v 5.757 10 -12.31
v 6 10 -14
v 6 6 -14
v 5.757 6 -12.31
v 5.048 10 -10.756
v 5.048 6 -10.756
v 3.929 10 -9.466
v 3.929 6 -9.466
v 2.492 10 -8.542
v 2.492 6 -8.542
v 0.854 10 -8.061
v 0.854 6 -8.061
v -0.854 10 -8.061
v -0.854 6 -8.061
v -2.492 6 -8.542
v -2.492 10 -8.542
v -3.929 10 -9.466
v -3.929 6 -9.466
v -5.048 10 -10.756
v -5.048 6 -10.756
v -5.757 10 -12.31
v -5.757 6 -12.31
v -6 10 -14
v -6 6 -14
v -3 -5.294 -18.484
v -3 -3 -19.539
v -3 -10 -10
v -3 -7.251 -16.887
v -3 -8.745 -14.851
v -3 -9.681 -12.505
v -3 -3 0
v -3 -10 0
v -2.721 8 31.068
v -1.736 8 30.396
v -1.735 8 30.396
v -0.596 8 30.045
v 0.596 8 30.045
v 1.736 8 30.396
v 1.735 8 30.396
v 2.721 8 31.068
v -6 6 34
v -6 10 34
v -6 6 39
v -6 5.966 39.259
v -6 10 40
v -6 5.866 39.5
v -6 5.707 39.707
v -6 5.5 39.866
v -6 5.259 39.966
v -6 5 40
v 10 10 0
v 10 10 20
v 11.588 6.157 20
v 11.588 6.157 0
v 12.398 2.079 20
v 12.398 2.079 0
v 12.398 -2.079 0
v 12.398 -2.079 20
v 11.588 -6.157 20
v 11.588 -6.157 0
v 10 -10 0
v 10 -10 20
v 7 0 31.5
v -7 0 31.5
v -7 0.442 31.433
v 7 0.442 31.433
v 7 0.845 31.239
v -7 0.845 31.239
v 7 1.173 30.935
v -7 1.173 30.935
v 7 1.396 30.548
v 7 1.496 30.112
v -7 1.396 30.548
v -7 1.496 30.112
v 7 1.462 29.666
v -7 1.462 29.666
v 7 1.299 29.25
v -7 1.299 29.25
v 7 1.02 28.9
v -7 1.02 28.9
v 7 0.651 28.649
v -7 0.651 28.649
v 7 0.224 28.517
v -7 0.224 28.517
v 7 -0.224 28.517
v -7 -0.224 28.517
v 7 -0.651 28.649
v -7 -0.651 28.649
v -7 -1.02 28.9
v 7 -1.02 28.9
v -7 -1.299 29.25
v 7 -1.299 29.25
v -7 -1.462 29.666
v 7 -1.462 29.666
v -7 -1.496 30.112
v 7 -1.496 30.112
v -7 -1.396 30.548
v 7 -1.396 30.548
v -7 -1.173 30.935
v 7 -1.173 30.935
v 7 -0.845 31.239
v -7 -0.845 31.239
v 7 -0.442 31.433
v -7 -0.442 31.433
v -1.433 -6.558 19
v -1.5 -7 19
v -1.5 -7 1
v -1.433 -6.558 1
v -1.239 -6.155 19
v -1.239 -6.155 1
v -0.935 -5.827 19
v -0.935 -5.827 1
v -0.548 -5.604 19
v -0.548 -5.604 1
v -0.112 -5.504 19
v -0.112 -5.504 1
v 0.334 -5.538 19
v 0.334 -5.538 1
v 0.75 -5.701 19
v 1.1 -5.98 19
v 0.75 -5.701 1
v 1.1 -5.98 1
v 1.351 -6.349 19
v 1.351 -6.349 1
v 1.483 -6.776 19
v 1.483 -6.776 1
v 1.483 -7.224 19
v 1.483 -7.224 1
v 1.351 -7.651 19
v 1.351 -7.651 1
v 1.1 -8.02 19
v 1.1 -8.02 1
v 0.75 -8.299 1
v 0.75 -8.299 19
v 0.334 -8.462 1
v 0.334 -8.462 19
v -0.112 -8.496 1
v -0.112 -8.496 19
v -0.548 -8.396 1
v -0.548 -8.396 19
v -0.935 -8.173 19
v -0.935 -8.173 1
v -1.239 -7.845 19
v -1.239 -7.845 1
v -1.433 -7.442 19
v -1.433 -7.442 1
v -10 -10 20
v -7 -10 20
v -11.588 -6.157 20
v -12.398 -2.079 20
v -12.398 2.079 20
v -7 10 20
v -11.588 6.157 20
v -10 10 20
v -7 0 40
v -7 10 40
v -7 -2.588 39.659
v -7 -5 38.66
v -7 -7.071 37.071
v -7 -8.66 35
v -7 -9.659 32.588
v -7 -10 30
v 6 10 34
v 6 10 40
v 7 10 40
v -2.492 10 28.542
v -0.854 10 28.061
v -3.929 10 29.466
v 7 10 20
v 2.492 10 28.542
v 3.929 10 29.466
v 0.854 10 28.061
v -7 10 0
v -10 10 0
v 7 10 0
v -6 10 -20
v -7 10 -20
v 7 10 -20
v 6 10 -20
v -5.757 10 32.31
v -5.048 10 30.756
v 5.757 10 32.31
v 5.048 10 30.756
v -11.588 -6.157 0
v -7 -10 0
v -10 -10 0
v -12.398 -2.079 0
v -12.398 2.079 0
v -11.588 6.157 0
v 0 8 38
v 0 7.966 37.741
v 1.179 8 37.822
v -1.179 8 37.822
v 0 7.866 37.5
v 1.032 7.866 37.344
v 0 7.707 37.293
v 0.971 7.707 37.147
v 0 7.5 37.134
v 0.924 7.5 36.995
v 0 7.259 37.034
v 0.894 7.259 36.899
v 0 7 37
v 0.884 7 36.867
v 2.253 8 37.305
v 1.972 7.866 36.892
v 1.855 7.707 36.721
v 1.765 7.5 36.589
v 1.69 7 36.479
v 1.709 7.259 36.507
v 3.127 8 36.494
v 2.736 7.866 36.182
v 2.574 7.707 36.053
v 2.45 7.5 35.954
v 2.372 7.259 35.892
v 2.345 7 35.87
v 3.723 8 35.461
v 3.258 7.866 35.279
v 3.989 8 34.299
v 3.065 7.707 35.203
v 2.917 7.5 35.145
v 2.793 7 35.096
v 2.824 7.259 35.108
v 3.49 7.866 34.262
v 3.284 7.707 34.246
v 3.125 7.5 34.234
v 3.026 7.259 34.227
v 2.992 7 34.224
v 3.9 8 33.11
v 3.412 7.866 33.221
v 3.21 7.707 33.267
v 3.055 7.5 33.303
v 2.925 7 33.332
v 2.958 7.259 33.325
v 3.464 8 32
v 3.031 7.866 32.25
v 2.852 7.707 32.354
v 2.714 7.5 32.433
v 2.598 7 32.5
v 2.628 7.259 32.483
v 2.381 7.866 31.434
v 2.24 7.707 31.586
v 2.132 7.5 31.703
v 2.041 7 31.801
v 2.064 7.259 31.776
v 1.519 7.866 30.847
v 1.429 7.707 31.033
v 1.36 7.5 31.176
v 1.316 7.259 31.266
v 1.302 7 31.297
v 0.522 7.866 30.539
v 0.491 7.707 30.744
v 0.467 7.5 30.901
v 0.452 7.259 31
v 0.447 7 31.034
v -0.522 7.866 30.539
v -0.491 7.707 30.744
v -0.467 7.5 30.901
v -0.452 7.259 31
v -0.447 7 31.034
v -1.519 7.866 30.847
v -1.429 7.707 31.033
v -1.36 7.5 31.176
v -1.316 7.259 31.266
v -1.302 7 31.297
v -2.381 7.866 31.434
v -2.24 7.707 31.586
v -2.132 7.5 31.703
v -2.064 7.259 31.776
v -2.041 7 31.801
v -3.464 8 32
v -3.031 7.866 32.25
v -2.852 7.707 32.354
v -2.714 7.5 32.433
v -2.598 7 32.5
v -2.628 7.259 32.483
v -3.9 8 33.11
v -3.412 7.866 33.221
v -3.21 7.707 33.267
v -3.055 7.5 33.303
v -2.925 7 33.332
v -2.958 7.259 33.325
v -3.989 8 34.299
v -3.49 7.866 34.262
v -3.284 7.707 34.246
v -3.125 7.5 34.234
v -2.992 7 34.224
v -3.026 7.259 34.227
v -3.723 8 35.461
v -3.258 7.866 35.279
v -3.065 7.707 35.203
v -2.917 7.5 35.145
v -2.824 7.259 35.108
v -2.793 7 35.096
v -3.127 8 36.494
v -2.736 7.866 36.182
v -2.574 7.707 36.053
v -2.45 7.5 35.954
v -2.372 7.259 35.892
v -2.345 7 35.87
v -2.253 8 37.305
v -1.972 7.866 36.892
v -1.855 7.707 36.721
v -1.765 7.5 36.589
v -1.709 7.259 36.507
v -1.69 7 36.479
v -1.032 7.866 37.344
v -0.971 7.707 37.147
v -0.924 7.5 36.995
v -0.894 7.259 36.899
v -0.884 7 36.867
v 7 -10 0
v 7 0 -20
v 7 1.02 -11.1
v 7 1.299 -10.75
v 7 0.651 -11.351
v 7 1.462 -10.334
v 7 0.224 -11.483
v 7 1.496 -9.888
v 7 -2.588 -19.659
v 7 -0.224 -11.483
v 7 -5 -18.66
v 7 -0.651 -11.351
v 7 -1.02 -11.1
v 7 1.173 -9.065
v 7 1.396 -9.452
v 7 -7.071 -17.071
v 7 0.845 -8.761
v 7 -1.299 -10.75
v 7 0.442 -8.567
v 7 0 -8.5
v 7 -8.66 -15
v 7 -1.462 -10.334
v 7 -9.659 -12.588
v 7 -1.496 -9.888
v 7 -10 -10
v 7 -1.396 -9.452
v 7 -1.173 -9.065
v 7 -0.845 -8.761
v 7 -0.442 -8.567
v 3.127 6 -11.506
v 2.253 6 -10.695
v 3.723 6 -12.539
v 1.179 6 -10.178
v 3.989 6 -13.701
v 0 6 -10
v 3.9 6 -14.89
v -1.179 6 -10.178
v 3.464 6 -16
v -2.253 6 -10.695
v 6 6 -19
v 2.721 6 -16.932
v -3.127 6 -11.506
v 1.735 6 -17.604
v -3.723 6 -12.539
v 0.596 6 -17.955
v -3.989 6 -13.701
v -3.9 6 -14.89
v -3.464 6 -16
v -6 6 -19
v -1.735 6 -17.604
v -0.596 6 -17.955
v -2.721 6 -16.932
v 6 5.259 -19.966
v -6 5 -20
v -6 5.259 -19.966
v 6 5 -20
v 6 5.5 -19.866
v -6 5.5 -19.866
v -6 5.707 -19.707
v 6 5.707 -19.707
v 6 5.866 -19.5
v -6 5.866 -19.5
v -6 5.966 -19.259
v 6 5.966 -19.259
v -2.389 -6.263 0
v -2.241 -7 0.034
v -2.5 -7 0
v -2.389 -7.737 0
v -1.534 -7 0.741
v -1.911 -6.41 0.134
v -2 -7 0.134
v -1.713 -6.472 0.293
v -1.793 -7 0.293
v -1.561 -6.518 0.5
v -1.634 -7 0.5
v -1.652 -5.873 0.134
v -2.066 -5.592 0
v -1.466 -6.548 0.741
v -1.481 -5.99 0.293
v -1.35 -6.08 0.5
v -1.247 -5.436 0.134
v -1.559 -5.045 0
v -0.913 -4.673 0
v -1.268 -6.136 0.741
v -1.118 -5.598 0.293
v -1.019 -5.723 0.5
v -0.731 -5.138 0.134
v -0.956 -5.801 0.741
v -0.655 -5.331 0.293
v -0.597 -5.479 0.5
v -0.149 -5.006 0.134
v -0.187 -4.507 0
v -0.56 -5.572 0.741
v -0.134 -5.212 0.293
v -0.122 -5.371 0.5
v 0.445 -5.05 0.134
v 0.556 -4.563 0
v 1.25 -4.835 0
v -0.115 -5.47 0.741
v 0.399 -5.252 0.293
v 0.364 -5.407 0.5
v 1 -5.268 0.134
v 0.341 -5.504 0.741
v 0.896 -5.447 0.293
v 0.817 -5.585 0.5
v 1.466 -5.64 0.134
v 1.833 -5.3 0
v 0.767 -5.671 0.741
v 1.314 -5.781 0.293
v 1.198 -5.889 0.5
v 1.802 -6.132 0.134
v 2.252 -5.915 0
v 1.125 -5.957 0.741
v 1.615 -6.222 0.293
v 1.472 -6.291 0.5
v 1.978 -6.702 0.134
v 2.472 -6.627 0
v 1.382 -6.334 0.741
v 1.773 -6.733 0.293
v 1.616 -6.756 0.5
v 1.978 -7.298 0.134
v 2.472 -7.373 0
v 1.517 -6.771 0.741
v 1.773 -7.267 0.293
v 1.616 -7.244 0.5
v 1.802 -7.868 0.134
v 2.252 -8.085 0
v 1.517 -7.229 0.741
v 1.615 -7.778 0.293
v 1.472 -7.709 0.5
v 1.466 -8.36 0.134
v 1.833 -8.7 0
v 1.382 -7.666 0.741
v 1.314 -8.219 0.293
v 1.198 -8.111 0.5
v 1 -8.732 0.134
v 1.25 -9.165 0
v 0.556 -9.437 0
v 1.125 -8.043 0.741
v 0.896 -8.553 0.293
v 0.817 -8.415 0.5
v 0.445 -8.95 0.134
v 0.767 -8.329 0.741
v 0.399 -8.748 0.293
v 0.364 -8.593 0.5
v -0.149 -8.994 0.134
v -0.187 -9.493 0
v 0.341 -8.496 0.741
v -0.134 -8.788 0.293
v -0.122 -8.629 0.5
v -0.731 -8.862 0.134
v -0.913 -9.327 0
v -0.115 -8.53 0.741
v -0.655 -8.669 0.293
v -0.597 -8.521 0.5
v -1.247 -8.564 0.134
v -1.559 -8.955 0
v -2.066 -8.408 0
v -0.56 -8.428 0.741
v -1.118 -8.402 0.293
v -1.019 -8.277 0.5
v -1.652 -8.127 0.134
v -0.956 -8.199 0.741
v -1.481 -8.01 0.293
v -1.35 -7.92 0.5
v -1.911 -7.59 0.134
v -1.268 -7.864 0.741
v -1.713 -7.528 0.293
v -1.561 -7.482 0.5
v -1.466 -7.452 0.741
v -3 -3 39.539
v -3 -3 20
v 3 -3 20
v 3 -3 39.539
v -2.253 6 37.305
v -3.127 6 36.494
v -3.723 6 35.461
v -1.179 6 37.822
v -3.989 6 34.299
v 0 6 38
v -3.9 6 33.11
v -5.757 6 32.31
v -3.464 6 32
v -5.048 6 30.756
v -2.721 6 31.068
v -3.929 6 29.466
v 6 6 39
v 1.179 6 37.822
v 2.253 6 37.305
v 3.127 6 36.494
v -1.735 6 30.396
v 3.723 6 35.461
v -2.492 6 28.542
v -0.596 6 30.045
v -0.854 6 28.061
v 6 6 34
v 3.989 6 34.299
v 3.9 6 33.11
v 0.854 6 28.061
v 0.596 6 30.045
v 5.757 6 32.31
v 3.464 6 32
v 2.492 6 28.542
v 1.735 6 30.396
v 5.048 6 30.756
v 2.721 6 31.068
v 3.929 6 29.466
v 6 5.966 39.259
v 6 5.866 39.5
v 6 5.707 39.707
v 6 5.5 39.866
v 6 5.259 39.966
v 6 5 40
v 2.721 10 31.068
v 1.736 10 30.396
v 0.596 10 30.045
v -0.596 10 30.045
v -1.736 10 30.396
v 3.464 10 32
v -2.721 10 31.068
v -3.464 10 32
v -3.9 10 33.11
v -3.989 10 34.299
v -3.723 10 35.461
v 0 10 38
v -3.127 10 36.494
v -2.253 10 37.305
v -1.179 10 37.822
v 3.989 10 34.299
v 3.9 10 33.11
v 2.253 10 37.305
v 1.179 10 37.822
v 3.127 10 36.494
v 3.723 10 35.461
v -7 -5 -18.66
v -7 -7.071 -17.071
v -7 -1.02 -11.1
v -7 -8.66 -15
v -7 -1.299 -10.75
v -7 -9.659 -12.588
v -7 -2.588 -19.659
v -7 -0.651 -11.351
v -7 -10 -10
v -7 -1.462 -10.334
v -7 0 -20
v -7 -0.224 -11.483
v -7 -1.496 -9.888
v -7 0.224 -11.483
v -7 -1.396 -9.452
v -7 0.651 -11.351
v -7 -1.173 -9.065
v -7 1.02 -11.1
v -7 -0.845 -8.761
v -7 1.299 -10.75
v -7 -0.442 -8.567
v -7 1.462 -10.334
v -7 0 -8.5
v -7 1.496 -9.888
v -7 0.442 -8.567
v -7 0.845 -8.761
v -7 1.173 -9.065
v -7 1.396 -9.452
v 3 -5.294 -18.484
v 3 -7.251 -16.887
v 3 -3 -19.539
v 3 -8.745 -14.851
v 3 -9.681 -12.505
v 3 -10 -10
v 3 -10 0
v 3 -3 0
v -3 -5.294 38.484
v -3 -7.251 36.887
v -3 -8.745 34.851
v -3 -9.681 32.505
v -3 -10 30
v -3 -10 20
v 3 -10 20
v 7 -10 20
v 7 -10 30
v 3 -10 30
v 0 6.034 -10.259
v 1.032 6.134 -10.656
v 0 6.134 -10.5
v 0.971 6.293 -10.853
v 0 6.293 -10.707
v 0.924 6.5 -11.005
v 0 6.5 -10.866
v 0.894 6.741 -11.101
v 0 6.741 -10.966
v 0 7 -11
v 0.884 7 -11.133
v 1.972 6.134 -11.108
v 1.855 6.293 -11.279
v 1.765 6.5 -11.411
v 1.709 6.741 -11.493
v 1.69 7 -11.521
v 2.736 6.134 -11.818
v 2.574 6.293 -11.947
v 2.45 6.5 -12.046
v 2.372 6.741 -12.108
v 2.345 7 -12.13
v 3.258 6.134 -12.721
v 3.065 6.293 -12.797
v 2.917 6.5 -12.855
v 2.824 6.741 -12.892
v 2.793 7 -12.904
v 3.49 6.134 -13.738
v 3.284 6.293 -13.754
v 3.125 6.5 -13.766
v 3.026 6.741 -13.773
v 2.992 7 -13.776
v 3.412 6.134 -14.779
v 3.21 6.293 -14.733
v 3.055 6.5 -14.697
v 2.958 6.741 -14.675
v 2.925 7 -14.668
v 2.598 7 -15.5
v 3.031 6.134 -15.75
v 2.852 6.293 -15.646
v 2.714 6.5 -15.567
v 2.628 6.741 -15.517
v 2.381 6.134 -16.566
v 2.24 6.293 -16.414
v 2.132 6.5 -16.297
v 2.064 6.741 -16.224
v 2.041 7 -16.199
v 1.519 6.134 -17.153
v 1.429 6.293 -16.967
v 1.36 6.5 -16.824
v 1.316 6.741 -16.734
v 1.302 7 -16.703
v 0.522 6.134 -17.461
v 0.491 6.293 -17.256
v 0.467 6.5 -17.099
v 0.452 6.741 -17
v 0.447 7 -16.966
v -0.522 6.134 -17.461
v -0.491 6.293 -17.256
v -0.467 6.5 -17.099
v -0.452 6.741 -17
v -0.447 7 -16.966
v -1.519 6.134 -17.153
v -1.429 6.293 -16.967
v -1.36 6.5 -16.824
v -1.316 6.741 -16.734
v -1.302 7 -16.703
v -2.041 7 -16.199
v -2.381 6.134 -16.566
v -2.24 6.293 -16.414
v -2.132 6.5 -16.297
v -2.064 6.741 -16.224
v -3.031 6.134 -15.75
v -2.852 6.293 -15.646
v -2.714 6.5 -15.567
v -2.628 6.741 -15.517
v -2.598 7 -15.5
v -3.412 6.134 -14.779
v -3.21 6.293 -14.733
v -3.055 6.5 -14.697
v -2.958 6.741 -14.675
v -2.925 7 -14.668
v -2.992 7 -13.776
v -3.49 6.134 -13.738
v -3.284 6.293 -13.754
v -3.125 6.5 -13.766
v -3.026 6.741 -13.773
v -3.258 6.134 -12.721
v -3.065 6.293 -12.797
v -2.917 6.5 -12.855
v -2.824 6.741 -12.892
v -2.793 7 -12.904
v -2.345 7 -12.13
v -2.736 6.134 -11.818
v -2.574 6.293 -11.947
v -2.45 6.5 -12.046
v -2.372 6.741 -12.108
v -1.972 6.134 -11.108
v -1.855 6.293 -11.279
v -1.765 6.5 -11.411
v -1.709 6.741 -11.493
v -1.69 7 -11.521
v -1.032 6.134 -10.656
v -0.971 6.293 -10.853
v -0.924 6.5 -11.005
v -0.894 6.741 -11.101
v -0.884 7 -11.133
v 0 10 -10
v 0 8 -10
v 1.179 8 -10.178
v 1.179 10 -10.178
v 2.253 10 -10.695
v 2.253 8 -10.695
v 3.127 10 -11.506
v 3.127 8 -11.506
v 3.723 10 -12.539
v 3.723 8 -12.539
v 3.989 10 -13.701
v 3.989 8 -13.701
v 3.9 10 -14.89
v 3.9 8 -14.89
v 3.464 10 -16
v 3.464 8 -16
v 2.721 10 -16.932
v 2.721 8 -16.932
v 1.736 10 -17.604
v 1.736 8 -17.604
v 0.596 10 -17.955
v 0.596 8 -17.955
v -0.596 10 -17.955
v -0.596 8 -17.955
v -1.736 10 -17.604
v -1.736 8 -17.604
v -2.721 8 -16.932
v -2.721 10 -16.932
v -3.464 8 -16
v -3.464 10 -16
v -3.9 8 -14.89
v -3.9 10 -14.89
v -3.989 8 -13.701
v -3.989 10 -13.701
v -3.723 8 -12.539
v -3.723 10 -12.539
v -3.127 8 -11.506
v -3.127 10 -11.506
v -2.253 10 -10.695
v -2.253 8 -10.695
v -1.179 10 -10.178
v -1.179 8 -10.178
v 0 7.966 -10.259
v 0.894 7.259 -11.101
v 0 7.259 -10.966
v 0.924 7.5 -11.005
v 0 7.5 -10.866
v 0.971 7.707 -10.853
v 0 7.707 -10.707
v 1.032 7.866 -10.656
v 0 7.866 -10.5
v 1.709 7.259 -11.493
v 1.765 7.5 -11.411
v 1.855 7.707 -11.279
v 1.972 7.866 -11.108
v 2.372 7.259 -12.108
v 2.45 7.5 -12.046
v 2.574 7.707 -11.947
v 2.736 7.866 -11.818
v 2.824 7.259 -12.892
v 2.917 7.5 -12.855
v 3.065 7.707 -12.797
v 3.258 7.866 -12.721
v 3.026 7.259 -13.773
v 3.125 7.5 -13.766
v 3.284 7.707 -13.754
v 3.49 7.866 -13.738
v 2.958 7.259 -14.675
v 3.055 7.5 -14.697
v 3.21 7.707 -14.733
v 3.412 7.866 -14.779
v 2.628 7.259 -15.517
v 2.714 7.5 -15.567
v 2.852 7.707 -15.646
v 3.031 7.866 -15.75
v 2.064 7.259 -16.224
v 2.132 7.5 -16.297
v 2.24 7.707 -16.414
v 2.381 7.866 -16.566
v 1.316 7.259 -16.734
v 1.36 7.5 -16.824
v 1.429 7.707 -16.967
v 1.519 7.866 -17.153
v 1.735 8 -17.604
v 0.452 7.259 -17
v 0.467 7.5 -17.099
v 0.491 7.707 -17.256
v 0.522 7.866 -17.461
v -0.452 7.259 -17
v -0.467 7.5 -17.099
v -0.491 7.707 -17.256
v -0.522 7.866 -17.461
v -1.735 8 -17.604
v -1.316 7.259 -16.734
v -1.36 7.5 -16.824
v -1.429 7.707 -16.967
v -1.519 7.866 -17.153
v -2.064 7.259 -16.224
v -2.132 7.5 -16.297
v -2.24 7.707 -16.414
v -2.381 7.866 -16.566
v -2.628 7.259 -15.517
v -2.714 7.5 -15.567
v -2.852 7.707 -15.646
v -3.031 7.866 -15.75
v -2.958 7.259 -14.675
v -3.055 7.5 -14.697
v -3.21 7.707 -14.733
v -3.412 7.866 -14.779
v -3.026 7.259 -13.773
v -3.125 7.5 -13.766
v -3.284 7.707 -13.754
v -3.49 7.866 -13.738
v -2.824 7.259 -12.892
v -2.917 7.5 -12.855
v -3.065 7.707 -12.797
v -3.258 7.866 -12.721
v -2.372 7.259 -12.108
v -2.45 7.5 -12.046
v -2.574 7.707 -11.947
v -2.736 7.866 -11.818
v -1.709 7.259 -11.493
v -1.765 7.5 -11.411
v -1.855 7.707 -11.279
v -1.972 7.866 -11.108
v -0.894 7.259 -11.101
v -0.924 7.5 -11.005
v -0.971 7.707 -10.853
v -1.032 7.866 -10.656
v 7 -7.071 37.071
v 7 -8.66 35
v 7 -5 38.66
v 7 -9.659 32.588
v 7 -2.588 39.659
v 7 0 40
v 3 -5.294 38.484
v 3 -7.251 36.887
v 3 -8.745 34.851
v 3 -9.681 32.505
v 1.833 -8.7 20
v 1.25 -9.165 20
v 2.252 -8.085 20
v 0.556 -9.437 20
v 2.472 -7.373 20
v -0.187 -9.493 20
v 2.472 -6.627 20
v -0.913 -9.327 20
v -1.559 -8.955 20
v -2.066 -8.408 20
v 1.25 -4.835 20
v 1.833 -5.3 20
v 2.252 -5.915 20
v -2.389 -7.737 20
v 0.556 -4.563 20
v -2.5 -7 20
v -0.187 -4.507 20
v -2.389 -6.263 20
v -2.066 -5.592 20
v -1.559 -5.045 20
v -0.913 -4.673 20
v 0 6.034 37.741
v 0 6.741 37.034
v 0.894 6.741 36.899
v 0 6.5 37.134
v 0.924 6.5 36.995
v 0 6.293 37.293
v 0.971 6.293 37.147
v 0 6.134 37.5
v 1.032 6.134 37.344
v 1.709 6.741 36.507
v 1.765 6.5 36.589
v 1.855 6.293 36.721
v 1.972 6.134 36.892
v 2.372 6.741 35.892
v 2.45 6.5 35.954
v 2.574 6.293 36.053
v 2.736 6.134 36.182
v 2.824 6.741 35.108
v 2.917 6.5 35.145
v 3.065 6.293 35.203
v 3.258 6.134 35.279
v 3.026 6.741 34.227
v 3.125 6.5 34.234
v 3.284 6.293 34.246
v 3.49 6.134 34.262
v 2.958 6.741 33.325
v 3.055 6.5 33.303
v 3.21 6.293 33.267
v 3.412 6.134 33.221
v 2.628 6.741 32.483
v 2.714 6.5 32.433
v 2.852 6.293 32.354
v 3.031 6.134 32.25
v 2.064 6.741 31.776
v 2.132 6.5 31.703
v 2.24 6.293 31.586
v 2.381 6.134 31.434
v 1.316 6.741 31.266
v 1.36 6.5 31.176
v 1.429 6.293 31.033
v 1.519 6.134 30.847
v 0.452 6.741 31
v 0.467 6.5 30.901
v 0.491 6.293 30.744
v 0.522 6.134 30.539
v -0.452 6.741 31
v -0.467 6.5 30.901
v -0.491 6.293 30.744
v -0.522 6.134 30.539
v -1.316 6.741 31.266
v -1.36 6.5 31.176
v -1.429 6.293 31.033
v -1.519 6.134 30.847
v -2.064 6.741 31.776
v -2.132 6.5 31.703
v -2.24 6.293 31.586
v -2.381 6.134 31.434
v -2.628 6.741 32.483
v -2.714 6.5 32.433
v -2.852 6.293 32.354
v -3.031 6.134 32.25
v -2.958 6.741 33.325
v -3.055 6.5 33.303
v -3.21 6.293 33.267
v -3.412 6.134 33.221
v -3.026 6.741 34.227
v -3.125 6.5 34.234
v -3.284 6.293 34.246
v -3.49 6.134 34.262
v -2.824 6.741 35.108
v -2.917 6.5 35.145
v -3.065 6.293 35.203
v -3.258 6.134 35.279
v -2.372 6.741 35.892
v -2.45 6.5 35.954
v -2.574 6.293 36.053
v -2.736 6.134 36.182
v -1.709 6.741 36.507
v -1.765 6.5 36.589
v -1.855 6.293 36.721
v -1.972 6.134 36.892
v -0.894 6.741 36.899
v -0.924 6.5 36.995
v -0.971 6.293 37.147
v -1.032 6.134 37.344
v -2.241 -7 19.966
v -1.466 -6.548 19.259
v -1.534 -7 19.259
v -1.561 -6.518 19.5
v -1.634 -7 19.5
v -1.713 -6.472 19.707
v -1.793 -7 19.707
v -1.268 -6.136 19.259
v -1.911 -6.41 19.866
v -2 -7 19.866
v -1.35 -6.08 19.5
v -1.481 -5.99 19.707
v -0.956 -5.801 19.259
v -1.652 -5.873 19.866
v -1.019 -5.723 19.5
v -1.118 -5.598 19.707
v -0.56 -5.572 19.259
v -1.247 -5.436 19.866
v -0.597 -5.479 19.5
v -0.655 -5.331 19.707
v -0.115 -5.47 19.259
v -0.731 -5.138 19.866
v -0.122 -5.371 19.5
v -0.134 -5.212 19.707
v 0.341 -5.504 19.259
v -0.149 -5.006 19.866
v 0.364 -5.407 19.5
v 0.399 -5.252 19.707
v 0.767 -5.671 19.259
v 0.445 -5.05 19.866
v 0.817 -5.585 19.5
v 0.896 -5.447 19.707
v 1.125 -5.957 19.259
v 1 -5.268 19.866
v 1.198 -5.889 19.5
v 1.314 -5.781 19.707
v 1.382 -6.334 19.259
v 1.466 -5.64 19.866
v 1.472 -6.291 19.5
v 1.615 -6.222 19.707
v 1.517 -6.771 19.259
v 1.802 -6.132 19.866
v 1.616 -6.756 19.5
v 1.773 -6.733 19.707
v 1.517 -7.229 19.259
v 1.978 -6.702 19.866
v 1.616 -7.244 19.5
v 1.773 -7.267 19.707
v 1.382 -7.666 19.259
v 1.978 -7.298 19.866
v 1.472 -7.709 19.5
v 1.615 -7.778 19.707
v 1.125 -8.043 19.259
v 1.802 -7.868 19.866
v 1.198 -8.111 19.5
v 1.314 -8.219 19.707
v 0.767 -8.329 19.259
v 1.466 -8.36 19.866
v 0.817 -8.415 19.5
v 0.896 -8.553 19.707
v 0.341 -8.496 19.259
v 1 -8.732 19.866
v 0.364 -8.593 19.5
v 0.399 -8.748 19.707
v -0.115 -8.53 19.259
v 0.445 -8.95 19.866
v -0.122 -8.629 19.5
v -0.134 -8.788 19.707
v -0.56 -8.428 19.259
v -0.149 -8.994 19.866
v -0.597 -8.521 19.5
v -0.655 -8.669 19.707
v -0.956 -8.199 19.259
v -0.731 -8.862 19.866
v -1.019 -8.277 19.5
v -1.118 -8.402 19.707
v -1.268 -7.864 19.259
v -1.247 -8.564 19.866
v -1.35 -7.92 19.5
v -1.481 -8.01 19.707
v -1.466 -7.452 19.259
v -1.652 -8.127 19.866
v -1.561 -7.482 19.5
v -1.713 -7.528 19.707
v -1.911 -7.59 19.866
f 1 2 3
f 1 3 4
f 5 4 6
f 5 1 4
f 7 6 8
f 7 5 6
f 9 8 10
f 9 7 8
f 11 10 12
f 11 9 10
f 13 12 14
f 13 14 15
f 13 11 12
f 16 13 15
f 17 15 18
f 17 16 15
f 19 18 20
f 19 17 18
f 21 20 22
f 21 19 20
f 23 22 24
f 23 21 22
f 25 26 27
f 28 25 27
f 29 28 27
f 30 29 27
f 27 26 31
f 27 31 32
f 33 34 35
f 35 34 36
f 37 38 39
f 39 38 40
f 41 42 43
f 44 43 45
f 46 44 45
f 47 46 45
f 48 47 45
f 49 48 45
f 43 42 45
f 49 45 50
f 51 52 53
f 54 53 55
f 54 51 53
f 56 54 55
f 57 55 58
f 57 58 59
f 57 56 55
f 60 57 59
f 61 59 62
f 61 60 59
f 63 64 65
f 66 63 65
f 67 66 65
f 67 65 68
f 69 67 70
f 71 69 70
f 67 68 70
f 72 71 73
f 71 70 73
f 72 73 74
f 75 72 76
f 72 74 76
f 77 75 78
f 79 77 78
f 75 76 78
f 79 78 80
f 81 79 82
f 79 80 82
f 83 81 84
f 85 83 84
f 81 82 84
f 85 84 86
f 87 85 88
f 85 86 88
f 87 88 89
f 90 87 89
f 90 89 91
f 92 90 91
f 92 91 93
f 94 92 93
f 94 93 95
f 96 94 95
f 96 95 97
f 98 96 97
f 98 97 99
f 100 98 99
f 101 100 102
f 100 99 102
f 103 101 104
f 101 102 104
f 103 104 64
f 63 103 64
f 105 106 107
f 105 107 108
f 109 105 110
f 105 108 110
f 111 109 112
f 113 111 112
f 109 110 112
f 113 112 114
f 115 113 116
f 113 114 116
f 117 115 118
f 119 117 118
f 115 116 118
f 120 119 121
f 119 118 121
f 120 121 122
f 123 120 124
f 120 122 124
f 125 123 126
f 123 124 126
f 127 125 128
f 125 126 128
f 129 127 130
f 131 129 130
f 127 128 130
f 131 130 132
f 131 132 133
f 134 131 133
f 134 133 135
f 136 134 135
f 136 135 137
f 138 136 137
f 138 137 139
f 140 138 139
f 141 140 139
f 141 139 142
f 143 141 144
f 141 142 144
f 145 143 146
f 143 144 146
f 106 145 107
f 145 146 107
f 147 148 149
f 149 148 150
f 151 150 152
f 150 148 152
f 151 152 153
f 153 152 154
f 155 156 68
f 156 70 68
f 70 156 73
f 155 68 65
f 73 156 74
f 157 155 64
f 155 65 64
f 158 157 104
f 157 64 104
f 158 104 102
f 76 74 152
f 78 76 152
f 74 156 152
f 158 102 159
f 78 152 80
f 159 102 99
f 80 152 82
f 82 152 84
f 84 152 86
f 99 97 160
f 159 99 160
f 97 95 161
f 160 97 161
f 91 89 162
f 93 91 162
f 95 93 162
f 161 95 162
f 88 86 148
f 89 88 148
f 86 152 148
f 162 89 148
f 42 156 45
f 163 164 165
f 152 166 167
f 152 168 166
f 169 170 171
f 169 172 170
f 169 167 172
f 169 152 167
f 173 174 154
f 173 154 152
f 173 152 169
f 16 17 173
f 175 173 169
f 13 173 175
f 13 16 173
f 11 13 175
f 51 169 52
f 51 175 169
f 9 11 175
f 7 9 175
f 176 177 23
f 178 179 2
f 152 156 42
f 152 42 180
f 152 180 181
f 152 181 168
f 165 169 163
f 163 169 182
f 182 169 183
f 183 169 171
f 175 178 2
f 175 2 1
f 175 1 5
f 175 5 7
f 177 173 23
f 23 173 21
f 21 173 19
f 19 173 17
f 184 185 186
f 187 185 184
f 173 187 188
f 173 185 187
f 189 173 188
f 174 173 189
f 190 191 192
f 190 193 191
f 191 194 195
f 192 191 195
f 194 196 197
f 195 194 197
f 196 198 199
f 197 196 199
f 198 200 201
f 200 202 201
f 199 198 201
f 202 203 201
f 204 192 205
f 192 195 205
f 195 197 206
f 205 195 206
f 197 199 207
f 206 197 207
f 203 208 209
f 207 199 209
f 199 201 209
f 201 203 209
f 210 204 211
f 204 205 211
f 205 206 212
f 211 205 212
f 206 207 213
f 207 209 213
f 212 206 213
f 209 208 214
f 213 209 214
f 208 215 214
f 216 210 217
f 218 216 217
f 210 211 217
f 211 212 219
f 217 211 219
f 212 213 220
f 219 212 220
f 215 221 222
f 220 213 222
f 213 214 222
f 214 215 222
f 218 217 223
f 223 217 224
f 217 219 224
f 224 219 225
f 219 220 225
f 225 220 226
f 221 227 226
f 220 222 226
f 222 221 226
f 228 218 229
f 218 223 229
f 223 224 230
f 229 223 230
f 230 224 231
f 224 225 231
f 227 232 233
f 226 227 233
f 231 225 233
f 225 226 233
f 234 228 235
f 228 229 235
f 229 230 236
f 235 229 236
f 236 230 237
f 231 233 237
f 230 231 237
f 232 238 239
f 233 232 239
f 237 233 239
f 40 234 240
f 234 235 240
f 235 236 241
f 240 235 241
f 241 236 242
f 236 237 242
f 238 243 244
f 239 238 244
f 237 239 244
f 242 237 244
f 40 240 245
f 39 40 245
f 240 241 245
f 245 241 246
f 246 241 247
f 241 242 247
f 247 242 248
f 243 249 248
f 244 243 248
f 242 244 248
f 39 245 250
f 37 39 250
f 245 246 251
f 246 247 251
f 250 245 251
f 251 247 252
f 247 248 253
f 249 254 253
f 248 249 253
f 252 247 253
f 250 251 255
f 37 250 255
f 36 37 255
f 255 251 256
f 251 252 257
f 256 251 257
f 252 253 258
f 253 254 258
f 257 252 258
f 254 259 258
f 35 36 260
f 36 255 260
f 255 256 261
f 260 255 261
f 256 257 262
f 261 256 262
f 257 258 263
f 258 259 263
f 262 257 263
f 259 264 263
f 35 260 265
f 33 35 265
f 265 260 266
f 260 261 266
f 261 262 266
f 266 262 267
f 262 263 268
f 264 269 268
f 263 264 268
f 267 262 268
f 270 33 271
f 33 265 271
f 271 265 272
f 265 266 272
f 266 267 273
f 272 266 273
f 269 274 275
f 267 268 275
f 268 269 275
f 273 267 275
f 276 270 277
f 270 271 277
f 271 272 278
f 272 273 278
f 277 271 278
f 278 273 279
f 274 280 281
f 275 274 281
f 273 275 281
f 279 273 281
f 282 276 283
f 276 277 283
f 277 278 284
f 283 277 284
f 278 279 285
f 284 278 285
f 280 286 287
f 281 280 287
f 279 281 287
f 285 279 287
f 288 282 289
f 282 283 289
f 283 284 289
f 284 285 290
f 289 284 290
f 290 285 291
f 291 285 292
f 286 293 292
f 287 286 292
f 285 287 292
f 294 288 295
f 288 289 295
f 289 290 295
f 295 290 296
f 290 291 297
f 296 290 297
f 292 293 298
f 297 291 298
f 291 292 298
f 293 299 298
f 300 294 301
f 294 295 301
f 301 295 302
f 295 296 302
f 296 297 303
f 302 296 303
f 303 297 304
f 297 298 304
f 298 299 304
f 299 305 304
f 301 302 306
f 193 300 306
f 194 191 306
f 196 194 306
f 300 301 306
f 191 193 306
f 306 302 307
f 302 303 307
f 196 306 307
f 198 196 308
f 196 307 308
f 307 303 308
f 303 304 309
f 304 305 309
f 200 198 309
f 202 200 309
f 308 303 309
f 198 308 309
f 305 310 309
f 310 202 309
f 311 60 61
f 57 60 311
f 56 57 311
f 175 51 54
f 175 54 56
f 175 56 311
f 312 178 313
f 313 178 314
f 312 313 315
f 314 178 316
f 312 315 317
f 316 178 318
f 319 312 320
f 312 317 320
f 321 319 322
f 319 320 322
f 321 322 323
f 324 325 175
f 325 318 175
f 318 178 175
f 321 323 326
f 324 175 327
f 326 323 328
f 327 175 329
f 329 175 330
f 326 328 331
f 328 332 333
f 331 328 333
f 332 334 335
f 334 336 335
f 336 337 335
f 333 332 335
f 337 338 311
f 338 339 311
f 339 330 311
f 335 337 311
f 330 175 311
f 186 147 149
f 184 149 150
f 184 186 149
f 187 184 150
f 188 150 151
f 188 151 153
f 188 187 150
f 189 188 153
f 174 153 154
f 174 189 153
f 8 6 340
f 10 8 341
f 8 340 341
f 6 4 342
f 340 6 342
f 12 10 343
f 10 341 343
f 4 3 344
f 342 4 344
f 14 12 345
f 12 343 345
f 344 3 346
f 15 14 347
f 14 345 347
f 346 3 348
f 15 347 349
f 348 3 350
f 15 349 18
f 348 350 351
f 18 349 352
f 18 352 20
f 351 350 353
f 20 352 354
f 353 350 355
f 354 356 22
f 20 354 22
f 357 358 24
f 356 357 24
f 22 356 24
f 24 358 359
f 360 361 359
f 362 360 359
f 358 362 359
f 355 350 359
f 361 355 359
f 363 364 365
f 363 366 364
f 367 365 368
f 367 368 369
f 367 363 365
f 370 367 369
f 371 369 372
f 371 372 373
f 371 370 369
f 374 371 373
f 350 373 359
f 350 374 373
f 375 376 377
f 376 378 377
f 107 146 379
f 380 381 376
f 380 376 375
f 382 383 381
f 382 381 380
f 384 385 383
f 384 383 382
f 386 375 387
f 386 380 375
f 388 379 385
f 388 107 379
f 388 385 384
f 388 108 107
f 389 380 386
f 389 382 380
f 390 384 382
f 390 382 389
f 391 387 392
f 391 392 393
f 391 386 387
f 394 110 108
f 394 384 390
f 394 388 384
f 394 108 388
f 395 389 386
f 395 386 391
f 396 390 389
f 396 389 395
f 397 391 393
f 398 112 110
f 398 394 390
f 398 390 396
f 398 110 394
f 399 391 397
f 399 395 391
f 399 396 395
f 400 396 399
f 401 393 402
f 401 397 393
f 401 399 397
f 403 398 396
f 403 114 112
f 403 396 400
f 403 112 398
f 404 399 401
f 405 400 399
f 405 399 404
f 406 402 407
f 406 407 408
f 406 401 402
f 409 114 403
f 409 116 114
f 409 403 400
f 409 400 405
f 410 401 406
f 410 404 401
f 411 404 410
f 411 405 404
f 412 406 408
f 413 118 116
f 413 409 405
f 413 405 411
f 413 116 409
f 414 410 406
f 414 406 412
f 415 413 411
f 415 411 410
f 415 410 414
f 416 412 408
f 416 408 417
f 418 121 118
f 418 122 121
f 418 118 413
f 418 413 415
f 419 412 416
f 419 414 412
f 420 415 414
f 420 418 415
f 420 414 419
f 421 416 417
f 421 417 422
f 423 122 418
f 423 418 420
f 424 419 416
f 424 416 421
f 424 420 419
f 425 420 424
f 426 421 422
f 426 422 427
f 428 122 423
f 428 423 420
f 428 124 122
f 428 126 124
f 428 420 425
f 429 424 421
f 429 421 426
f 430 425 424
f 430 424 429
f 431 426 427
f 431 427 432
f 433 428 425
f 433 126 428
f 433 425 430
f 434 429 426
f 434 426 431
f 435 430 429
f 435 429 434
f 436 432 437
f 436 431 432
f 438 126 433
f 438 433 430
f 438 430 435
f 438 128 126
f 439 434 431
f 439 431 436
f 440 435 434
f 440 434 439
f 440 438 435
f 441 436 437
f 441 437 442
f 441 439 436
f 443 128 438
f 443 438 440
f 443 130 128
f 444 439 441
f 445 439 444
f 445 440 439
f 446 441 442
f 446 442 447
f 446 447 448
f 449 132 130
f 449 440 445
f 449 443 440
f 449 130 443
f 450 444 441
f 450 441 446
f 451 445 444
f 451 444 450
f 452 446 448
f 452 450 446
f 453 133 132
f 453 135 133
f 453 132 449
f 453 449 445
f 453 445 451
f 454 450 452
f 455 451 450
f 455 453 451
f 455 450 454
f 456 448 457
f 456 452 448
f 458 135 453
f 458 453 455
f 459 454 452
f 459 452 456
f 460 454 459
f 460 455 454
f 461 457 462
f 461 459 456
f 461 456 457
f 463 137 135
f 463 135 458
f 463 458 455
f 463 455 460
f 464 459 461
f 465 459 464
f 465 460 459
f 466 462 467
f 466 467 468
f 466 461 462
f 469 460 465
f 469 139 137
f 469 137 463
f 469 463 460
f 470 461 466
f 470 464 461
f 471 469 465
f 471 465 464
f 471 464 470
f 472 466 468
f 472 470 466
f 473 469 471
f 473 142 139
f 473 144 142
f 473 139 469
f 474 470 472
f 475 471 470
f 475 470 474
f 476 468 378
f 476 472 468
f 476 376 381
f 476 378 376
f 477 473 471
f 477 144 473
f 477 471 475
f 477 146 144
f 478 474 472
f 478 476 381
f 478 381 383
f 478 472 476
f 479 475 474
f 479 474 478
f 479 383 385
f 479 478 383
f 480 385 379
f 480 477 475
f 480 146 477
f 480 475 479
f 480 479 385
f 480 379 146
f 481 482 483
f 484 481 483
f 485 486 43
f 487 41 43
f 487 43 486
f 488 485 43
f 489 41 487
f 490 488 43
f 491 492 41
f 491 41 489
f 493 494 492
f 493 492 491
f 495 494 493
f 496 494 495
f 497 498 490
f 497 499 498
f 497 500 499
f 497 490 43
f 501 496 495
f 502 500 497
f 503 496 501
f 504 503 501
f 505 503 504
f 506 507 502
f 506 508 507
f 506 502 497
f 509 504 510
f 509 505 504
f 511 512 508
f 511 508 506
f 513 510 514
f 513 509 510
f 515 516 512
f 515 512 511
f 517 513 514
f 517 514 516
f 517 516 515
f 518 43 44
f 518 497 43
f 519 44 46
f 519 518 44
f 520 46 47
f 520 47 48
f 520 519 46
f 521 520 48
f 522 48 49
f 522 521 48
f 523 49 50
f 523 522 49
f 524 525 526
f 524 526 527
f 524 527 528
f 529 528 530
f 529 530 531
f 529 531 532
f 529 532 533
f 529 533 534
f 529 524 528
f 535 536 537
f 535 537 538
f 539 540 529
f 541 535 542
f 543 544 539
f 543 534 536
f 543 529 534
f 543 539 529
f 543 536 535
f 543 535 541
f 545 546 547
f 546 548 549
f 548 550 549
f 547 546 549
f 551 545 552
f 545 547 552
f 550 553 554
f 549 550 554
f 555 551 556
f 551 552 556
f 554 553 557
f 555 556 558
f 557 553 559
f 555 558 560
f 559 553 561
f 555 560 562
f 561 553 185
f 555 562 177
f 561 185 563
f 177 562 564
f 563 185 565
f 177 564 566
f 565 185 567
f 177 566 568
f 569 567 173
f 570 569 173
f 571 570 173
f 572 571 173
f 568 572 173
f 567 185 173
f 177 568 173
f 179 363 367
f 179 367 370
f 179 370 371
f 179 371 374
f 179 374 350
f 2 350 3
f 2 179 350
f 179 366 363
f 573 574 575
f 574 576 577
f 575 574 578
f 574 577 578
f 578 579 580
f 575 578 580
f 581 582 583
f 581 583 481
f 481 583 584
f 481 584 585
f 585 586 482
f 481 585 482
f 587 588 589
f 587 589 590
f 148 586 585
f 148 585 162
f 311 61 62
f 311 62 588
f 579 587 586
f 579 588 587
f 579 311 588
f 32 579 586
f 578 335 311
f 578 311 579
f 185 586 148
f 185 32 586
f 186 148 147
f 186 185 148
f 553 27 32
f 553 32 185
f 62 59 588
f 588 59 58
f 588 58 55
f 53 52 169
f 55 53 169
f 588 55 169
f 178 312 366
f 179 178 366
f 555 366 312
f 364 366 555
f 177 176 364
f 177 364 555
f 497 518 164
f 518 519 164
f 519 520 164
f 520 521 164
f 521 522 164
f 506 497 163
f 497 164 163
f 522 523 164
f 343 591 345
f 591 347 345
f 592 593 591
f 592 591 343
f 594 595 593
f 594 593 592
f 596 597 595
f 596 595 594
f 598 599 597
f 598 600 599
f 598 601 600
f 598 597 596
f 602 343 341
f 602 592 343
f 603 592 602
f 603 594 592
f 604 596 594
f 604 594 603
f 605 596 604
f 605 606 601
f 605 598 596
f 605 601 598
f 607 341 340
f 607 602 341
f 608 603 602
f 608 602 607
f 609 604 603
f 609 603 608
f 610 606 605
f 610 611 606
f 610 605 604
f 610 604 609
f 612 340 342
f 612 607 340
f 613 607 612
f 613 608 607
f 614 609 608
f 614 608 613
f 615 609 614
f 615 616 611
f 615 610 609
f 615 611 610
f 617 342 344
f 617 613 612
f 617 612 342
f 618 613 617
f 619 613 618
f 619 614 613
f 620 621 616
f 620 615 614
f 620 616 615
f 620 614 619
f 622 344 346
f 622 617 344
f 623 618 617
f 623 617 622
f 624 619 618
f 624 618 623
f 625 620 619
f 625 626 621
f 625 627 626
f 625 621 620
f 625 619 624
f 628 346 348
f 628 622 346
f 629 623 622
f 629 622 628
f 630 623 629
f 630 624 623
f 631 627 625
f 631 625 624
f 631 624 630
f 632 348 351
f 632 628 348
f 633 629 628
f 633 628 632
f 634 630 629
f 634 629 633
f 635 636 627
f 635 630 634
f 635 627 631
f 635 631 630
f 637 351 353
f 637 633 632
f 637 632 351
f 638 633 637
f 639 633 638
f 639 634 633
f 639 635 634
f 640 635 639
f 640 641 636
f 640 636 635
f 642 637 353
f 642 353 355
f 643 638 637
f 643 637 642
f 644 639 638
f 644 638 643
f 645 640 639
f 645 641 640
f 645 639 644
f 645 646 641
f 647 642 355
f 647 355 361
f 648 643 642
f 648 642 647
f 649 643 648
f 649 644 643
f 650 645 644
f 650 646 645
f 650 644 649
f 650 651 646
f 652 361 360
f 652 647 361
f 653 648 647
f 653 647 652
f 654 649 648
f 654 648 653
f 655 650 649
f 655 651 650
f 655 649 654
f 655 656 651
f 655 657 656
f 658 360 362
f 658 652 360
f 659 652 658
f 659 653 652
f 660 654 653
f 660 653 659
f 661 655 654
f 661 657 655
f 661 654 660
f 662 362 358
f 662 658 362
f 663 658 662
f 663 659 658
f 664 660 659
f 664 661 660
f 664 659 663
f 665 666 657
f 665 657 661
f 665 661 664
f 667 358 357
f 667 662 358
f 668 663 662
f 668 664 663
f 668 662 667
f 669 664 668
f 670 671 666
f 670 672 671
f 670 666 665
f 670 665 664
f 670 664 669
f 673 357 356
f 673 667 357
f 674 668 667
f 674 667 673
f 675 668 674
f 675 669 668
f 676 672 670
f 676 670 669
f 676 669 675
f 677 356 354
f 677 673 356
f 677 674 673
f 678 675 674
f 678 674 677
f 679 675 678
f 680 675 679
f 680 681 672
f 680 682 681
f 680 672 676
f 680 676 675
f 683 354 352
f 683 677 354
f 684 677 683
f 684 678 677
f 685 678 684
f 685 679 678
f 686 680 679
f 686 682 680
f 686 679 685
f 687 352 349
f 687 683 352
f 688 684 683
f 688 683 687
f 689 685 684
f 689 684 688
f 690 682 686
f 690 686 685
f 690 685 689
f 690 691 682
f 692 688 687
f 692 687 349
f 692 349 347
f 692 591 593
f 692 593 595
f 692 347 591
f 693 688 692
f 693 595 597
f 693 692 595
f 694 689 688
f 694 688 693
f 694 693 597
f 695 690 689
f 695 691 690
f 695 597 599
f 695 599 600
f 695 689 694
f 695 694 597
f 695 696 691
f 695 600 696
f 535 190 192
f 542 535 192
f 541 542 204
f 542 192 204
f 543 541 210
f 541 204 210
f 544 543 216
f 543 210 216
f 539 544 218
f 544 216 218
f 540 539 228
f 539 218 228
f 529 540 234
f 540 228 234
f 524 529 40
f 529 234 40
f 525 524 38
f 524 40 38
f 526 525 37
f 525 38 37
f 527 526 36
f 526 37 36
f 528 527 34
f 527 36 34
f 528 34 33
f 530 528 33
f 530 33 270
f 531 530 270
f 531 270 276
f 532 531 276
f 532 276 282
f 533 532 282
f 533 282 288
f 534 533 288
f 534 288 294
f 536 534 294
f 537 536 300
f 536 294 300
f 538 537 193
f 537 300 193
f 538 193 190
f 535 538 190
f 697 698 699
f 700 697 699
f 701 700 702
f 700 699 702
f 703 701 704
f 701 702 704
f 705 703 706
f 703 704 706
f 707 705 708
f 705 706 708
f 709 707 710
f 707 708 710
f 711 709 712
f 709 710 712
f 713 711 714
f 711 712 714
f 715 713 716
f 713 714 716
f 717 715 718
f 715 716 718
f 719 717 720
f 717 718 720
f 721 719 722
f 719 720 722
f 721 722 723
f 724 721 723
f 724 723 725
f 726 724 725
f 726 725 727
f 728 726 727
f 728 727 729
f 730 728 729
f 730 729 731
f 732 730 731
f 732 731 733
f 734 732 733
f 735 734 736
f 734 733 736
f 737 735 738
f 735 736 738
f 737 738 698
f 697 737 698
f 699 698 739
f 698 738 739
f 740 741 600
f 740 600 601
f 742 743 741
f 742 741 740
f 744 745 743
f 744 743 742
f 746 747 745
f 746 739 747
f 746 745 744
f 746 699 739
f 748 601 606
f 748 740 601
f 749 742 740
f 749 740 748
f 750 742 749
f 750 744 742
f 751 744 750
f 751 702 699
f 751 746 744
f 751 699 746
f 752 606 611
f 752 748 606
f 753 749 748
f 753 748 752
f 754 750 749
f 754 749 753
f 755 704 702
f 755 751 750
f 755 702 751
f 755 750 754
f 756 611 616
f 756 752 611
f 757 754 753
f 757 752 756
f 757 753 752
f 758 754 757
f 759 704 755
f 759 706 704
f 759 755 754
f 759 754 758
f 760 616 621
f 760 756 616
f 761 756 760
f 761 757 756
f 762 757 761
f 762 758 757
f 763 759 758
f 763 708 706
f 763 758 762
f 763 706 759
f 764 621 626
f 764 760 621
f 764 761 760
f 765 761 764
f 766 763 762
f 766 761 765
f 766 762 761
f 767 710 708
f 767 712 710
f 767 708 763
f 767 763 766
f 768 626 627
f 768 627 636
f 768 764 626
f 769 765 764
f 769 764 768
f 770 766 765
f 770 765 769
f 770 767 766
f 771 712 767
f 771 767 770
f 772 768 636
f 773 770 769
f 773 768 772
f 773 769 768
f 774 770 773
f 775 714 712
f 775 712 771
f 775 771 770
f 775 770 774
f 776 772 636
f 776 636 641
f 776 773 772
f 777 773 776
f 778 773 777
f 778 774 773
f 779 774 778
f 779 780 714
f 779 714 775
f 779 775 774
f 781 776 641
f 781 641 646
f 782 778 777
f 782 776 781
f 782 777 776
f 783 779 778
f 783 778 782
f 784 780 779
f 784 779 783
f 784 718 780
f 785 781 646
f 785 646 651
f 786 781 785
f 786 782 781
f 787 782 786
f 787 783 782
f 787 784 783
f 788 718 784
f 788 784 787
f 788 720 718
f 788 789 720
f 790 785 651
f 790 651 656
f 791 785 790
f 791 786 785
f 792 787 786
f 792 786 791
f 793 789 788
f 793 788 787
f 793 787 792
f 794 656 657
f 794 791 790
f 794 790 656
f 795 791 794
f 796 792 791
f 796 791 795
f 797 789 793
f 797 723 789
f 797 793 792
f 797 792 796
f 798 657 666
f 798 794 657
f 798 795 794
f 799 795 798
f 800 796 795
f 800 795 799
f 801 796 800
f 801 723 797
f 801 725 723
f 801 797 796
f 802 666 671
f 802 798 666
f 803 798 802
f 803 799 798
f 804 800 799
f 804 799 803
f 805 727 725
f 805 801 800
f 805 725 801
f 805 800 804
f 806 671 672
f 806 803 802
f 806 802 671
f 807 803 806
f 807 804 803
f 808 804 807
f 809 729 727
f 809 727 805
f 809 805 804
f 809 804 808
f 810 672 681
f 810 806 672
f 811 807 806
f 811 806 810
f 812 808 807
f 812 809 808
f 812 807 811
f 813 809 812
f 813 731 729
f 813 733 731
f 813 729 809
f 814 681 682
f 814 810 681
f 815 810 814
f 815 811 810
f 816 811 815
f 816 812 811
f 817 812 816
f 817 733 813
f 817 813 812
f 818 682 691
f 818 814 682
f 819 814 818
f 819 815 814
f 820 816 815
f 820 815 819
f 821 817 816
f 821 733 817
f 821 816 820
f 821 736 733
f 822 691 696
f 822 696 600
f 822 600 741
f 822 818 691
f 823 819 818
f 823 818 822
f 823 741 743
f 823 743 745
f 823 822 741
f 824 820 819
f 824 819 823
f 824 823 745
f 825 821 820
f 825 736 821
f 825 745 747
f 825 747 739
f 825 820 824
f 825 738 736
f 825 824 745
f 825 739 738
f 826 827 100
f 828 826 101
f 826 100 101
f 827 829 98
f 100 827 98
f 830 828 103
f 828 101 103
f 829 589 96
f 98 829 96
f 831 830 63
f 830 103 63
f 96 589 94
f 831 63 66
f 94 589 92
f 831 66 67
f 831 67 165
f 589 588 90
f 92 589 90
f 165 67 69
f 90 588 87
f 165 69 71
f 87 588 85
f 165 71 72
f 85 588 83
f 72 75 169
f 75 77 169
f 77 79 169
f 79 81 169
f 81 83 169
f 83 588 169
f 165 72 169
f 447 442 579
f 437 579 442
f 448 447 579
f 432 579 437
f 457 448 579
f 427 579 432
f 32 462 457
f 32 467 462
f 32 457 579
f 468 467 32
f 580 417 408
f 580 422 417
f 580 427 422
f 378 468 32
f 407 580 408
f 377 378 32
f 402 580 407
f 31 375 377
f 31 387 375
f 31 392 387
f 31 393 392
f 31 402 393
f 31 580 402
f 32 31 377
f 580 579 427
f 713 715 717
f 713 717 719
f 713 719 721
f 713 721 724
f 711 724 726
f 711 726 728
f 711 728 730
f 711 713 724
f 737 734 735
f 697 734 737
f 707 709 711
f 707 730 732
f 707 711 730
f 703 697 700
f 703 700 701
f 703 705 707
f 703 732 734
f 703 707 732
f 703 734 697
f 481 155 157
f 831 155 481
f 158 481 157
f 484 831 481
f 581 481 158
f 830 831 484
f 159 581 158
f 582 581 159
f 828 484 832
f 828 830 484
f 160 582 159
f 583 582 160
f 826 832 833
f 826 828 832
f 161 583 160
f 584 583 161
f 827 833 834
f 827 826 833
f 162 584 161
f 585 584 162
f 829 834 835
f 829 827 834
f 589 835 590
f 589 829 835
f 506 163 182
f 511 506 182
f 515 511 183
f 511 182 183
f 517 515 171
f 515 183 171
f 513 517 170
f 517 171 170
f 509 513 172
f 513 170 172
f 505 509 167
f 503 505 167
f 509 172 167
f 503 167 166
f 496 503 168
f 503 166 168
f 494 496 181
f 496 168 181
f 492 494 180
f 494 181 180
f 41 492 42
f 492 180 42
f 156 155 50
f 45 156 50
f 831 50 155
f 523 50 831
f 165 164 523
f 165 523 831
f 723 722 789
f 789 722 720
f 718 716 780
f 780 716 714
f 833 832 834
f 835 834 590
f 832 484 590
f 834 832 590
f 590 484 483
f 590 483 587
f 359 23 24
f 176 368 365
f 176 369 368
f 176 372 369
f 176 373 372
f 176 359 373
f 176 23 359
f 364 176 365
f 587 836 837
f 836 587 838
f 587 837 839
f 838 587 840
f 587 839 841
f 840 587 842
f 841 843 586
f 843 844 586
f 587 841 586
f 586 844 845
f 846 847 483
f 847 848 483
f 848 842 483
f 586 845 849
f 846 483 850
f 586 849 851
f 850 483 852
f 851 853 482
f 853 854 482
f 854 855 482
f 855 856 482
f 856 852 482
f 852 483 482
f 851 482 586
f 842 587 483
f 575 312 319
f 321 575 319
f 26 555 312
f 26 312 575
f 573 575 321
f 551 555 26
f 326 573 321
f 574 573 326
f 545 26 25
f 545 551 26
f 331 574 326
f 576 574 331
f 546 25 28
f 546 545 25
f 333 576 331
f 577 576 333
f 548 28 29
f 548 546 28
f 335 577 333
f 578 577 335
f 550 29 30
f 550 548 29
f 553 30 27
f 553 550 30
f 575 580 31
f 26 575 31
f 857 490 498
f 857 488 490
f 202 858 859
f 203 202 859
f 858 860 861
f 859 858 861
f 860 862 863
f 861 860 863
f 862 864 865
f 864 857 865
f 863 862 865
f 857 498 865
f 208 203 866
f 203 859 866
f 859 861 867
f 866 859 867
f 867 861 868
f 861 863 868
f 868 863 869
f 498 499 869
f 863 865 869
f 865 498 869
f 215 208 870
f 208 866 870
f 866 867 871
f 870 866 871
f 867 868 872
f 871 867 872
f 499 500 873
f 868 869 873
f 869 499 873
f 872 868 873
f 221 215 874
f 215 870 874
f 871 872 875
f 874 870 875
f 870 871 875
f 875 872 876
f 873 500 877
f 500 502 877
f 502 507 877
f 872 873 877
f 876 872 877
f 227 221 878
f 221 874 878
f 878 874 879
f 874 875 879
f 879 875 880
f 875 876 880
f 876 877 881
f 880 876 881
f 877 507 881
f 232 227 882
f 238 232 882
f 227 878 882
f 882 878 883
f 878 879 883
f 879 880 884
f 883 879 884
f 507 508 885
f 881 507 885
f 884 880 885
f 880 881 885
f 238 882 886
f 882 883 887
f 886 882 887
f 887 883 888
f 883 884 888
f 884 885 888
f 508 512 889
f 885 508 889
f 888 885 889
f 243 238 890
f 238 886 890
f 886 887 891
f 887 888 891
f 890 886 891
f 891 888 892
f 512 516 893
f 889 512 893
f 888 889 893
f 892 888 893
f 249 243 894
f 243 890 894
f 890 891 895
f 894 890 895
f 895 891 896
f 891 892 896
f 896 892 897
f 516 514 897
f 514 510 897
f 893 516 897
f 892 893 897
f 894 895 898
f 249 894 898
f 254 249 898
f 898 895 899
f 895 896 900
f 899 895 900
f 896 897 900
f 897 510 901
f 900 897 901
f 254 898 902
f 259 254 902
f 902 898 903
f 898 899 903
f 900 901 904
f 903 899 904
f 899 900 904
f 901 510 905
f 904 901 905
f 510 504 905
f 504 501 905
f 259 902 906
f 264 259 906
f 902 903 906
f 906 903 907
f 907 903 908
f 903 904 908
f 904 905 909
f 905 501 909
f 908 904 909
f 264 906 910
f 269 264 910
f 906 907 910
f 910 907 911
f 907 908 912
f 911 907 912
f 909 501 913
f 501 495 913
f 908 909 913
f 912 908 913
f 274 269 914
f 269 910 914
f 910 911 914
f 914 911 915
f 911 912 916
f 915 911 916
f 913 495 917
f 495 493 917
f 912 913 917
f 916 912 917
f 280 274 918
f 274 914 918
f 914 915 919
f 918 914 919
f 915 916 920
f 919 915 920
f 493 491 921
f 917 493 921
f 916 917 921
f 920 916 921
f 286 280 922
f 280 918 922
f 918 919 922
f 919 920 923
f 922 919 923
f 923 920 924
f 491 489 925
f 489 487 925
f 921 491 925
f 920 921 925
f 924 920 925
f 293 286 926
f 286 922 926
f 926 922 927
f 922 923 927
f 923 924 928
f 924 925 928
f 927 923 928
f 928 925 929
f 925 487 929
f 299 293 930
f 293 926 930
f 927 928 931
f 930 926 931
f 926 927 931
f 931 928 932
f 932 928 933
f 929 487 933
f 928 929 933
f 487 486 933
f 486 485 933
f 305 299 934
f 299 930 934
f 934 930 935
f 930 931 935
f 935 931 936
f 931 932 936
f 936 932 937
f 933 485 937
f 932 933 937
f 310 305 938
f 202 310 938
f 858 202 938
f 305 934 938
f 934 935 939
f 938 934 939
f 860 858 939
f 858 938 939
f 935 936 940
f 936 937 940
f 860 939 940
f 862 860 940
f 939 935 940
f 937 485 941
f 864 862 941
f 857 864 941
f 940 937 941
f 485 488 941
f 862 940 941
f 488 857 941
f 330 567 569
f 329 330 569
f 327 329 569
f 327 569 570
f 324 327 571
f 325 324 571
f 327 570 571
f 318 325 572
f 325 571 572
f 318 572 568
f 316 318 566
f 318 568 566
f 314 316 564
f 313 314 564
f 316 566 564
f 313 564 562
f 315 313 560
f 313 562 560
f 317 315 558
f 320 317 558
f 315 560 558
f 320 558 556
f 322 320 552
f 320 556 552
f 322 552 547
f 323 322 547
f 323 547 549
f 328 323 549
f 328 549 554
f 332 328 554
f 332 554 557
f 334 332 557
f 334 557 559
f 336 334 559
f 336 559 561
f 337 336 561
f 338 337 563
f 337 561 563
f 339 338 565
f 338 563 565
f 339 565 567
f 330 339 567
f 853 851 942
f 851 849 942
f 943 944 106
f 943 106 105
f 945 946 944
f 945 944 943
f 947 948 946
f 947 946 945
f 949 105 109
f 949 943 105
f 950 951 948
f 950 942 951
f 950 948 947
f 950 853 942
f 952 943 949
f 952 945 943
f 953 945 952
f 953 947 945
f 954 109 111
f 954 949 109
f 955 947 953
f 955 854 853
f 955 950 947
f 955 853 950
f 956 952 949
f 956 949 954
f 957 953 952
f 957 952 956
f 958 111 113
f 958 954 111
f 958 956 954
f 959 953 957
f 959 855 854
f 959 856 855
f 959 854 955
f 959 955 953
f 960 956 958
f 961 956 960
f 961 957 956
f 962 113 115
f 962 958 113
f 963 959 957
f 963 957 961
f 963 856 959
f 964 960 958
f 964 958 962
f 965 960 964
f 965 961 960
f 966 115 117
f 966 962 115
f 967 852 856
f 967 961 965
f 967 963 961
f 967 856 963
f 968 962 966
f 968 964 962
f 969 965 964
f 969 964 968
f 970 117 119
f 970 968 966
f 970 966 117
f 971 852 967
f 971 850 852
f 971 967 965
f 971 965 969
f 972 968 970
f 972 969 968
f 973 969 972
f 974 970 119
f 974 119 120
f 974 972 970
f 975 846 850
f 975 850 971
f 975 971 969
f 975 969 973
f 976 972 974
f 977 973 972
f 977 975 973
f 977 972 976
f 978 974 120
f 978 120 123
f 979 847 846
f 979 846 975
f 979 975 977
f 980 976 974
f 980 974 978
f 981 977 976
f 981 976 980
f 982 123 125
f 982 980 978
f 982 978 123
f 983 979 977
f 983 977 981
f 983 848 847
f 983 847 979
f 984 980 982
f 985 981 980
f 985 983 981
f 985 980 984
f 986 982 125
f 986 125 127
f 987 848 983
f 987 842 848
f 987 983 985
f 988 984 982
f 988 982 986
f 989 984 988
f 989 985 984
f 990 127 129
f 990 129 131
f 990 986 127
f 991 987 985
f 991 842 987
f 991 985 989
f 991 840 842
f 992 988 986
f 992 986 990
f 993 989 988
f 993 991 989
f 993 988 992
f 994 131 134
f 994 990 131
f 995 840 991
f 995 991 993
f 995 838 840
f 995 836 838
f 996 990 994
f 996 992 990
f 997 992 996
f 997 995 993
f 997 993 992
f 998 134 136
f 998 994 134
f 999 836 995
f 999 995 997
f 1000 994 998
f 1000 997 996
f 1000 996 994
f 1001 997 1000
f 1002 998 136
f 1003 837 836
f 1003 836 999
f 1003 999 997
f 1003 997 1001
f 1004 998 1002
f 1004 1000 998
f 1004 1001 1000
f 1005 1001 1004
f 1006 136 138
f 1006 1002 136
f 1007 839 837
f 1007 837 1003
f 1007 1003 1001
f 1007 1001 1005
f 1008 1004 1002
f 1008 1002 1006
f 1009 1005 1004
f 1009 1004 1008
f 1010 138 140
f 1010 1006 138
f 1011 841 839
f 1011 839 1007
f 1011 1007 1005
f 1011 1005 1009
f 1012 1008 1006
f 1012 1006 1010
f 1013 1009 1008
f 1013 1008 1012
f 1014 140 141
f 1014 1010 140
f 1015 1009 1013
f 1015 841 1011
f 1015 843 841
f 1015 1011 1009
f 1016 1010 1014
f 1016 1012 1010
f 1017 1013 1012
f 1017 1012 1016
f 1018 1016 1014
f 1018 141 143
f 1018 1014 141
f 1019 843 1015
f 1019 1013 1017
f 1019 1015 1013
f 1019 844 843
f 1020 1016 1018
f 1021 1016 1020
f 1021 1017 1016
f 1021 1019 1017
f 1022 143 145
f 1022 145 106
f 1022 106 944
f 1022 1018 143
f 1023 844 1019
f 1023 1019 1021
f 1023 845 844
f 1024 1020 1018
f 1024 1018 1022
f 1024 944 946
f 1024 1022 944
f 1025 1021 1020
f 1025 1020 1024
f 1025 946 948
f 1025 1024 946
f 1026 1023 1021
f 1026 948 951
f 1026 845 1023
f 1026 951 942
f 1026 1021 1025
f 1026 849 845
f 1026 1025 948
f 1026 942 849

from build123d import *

# Parameters (mm, degrees)
SALIENTE_EXTRUIR1_DEPTH = 20
CROQUIS5_R              = 1.5
CORTAR_EXTRUIR3_DEPTH   = 20
SALIENTE_EXTRUIR2_DEPTH = 20
SALIENTE_EXTRUIR3_DEPTH = 20
CROQUIS4_R              = 1.5
CORTAR_EXTRUIR2_DEPTH   = 14
REDONDEO1_R             = 10
CUT_EXTRUDE1_DEPTH      = 4
SKETCH2_R               = 3
BOSS_EXTRUDE1_DEPTH     = 2
SKETCH3_R               = 4
BOSS_EXTRUDE2_DEPTH     = 2
FILLET1_R               = 1
FILLET2_R               = 1
FILLET3_R               = 1


with BuildPart() as part:
    # Croquis1 → Saliente-Extruir1 (new body)
    with BuildSketch(Plane.XY):
        with BuildLine():
            Line((-10, 10), (10, 10))
            ThreePointArc((10, 10), (12.5, 0), (10, -10))
            Line((10, -10), (-10, -10))
            ThreePointArc((-10, -10), (-12.5, 0), (-10, 10))
        make_face()
    extrude(amount=SALIENTE_EXTRUIR1_DEPTH)

    # Croquis5 → Cortar-Extruir3 (cut)
    with BuildSketch(Plane(origin=(0, 0, 0), x_dir=(-1, 0, 0), z_dir=(0, 0, -1))):
        with Locations((0, -7)):
            Circle(CROQUIS5_R)
    extrude(amount=-CORTAR_EXTRUIR3_DEPTH, mode=Mode.SUBTRACT)

    # Croquis2 → Saliente-Extruir2 (add)
    with BuildSketch(Plane(origin=(0, 0, 0), x_dir=(-1, 0, 0), z_dir=(0, 0, -1))):
        Polygon((-7, 10), (-7, -10), (-3, -10), (-3, -3), (3, -3), (3, -10), (7, -10), (7, 10), align=None)
    extrude(amount=SALIENTE_EXTRUIR2_DEPTH)

    # Croquis3 → Saliente-Extruir3 (add)
    with BuildSketch(Plane.XY.offset(20)):
        Polygon((-7, 10), (-7, -10), (-3, -10), (-3, -3), (3, -3), (3, -10), (7, -10), (7, 10), align=None)
    extrude(amount=SALIENTE_EXTRUIR3_DEPTH)

    # Croquis4 → Cortar-Extruir2 (cut)
    with BuildSketch(Plane.ZY.offset(7)):
        with Locations((-10, 0)):
            Circle(CROQUIS4_R)
        with Locations((30, 0)):
            Circle(CROQUIS4_R)
    extrude(amount=-CORTAR_EXTRUIR2_DEPTH, mode=Mode.SUBTRACT)

    # Redondeo1
    redondeo1_edges = [part.edges().sort_by_distance(p)[0] for p in [
        (-5, -10, 40),
        (-5, -10, -20),
    ]]
    fillet(redondeo1_edges, radius=REDONDEO1_R)

    # Sketch1 → Cut-Extrude1 (cut)
    with BuildSketch(Plane(origin=(0, 10, 0), x_dir=(1, 0, 0), z_dir=(0, 1, 0))):
        with BuildLine():
            Line((-6, 14), (-6, 20))
            Line((-6, 20), (6, 20))
            Line((6, 20), (6, 14))
            ThreePointArc((6, 14), (0, 8), (-6, 14))
        make_face()
        with BuildLine():
            Line((-6, -34), (-6, -40))
            Line((-6, -40), (6, -40))
            Line((6, -40), (6, -34))
            ThreePointArc((6, -34), (0, -28), (-6, -34))
        make_face()
    extrude(amount=-CUT_EXTRUDE1_DEPTH, mode=Mode.SUBTRACT)

    # Sketch2 → Boss-Extrude1 (add)
    with BuildSketch(Plane(origin=(0, 6, 0), x_dir=(1, 0, 0), z_dir=(0, 1, 0))):
        with Locations(Location((0, -34, 0), (0, 0, 270))):
            Circle(SKETCH2_R)
        with Locations(Location((0, 14, 0), (0, 0, 270))):
            Circle(SKETCH2_R)
    extrude(amount=BOSS_EXTRUDE1_DEPTH)

    # Sketch3 → Boss-Extrude2 (add)
    with BuildSketch(Plane(origin=(0, 8, 0), x_dir=(1, 0, 0), z_dir=(0, 1, 0))):
        with Locations(Location((0, -34, 0), (0, 0, 270))):
            Circle(SKETCH3_R)
        with Locations(Location((0, 14, 0), (0, 0, 270))):
            Circle(SKETCH3_R)
    extrude(amount=BOSS_EXTRUDE2_DEPTH)

    # Fillet1
    fillet1_edges = [part.edges().sort_by_distance(p)[0] for p in [
        (0, 6, 31),
        (0, 8, 31),
        (0, 6, -17),
        (0, 8, -17),
    ]]
    fillet(fillet1_edges, radius=FILLET1_R - 0.0001)  # a hair under: the kernel refuses the full size

    # Fillet2
    fillet2_edges = [part.edges().sort_by_distance(p)[0] for p in [
        (0, 6, 40),
        (0, 6, -20),
    ]]
    fillet(fillet2_edges, radius=FILLET2_R)

    # Fillet3
    fillet3_edges = [part.edges().sort_by_distance(p)[0] for p in [
        (1.5, -7, 20),
        (1.5, -7, 0),
    ]]
    fillet(fillet3_edges, radius=FILLET3_R)


solid = part.part
